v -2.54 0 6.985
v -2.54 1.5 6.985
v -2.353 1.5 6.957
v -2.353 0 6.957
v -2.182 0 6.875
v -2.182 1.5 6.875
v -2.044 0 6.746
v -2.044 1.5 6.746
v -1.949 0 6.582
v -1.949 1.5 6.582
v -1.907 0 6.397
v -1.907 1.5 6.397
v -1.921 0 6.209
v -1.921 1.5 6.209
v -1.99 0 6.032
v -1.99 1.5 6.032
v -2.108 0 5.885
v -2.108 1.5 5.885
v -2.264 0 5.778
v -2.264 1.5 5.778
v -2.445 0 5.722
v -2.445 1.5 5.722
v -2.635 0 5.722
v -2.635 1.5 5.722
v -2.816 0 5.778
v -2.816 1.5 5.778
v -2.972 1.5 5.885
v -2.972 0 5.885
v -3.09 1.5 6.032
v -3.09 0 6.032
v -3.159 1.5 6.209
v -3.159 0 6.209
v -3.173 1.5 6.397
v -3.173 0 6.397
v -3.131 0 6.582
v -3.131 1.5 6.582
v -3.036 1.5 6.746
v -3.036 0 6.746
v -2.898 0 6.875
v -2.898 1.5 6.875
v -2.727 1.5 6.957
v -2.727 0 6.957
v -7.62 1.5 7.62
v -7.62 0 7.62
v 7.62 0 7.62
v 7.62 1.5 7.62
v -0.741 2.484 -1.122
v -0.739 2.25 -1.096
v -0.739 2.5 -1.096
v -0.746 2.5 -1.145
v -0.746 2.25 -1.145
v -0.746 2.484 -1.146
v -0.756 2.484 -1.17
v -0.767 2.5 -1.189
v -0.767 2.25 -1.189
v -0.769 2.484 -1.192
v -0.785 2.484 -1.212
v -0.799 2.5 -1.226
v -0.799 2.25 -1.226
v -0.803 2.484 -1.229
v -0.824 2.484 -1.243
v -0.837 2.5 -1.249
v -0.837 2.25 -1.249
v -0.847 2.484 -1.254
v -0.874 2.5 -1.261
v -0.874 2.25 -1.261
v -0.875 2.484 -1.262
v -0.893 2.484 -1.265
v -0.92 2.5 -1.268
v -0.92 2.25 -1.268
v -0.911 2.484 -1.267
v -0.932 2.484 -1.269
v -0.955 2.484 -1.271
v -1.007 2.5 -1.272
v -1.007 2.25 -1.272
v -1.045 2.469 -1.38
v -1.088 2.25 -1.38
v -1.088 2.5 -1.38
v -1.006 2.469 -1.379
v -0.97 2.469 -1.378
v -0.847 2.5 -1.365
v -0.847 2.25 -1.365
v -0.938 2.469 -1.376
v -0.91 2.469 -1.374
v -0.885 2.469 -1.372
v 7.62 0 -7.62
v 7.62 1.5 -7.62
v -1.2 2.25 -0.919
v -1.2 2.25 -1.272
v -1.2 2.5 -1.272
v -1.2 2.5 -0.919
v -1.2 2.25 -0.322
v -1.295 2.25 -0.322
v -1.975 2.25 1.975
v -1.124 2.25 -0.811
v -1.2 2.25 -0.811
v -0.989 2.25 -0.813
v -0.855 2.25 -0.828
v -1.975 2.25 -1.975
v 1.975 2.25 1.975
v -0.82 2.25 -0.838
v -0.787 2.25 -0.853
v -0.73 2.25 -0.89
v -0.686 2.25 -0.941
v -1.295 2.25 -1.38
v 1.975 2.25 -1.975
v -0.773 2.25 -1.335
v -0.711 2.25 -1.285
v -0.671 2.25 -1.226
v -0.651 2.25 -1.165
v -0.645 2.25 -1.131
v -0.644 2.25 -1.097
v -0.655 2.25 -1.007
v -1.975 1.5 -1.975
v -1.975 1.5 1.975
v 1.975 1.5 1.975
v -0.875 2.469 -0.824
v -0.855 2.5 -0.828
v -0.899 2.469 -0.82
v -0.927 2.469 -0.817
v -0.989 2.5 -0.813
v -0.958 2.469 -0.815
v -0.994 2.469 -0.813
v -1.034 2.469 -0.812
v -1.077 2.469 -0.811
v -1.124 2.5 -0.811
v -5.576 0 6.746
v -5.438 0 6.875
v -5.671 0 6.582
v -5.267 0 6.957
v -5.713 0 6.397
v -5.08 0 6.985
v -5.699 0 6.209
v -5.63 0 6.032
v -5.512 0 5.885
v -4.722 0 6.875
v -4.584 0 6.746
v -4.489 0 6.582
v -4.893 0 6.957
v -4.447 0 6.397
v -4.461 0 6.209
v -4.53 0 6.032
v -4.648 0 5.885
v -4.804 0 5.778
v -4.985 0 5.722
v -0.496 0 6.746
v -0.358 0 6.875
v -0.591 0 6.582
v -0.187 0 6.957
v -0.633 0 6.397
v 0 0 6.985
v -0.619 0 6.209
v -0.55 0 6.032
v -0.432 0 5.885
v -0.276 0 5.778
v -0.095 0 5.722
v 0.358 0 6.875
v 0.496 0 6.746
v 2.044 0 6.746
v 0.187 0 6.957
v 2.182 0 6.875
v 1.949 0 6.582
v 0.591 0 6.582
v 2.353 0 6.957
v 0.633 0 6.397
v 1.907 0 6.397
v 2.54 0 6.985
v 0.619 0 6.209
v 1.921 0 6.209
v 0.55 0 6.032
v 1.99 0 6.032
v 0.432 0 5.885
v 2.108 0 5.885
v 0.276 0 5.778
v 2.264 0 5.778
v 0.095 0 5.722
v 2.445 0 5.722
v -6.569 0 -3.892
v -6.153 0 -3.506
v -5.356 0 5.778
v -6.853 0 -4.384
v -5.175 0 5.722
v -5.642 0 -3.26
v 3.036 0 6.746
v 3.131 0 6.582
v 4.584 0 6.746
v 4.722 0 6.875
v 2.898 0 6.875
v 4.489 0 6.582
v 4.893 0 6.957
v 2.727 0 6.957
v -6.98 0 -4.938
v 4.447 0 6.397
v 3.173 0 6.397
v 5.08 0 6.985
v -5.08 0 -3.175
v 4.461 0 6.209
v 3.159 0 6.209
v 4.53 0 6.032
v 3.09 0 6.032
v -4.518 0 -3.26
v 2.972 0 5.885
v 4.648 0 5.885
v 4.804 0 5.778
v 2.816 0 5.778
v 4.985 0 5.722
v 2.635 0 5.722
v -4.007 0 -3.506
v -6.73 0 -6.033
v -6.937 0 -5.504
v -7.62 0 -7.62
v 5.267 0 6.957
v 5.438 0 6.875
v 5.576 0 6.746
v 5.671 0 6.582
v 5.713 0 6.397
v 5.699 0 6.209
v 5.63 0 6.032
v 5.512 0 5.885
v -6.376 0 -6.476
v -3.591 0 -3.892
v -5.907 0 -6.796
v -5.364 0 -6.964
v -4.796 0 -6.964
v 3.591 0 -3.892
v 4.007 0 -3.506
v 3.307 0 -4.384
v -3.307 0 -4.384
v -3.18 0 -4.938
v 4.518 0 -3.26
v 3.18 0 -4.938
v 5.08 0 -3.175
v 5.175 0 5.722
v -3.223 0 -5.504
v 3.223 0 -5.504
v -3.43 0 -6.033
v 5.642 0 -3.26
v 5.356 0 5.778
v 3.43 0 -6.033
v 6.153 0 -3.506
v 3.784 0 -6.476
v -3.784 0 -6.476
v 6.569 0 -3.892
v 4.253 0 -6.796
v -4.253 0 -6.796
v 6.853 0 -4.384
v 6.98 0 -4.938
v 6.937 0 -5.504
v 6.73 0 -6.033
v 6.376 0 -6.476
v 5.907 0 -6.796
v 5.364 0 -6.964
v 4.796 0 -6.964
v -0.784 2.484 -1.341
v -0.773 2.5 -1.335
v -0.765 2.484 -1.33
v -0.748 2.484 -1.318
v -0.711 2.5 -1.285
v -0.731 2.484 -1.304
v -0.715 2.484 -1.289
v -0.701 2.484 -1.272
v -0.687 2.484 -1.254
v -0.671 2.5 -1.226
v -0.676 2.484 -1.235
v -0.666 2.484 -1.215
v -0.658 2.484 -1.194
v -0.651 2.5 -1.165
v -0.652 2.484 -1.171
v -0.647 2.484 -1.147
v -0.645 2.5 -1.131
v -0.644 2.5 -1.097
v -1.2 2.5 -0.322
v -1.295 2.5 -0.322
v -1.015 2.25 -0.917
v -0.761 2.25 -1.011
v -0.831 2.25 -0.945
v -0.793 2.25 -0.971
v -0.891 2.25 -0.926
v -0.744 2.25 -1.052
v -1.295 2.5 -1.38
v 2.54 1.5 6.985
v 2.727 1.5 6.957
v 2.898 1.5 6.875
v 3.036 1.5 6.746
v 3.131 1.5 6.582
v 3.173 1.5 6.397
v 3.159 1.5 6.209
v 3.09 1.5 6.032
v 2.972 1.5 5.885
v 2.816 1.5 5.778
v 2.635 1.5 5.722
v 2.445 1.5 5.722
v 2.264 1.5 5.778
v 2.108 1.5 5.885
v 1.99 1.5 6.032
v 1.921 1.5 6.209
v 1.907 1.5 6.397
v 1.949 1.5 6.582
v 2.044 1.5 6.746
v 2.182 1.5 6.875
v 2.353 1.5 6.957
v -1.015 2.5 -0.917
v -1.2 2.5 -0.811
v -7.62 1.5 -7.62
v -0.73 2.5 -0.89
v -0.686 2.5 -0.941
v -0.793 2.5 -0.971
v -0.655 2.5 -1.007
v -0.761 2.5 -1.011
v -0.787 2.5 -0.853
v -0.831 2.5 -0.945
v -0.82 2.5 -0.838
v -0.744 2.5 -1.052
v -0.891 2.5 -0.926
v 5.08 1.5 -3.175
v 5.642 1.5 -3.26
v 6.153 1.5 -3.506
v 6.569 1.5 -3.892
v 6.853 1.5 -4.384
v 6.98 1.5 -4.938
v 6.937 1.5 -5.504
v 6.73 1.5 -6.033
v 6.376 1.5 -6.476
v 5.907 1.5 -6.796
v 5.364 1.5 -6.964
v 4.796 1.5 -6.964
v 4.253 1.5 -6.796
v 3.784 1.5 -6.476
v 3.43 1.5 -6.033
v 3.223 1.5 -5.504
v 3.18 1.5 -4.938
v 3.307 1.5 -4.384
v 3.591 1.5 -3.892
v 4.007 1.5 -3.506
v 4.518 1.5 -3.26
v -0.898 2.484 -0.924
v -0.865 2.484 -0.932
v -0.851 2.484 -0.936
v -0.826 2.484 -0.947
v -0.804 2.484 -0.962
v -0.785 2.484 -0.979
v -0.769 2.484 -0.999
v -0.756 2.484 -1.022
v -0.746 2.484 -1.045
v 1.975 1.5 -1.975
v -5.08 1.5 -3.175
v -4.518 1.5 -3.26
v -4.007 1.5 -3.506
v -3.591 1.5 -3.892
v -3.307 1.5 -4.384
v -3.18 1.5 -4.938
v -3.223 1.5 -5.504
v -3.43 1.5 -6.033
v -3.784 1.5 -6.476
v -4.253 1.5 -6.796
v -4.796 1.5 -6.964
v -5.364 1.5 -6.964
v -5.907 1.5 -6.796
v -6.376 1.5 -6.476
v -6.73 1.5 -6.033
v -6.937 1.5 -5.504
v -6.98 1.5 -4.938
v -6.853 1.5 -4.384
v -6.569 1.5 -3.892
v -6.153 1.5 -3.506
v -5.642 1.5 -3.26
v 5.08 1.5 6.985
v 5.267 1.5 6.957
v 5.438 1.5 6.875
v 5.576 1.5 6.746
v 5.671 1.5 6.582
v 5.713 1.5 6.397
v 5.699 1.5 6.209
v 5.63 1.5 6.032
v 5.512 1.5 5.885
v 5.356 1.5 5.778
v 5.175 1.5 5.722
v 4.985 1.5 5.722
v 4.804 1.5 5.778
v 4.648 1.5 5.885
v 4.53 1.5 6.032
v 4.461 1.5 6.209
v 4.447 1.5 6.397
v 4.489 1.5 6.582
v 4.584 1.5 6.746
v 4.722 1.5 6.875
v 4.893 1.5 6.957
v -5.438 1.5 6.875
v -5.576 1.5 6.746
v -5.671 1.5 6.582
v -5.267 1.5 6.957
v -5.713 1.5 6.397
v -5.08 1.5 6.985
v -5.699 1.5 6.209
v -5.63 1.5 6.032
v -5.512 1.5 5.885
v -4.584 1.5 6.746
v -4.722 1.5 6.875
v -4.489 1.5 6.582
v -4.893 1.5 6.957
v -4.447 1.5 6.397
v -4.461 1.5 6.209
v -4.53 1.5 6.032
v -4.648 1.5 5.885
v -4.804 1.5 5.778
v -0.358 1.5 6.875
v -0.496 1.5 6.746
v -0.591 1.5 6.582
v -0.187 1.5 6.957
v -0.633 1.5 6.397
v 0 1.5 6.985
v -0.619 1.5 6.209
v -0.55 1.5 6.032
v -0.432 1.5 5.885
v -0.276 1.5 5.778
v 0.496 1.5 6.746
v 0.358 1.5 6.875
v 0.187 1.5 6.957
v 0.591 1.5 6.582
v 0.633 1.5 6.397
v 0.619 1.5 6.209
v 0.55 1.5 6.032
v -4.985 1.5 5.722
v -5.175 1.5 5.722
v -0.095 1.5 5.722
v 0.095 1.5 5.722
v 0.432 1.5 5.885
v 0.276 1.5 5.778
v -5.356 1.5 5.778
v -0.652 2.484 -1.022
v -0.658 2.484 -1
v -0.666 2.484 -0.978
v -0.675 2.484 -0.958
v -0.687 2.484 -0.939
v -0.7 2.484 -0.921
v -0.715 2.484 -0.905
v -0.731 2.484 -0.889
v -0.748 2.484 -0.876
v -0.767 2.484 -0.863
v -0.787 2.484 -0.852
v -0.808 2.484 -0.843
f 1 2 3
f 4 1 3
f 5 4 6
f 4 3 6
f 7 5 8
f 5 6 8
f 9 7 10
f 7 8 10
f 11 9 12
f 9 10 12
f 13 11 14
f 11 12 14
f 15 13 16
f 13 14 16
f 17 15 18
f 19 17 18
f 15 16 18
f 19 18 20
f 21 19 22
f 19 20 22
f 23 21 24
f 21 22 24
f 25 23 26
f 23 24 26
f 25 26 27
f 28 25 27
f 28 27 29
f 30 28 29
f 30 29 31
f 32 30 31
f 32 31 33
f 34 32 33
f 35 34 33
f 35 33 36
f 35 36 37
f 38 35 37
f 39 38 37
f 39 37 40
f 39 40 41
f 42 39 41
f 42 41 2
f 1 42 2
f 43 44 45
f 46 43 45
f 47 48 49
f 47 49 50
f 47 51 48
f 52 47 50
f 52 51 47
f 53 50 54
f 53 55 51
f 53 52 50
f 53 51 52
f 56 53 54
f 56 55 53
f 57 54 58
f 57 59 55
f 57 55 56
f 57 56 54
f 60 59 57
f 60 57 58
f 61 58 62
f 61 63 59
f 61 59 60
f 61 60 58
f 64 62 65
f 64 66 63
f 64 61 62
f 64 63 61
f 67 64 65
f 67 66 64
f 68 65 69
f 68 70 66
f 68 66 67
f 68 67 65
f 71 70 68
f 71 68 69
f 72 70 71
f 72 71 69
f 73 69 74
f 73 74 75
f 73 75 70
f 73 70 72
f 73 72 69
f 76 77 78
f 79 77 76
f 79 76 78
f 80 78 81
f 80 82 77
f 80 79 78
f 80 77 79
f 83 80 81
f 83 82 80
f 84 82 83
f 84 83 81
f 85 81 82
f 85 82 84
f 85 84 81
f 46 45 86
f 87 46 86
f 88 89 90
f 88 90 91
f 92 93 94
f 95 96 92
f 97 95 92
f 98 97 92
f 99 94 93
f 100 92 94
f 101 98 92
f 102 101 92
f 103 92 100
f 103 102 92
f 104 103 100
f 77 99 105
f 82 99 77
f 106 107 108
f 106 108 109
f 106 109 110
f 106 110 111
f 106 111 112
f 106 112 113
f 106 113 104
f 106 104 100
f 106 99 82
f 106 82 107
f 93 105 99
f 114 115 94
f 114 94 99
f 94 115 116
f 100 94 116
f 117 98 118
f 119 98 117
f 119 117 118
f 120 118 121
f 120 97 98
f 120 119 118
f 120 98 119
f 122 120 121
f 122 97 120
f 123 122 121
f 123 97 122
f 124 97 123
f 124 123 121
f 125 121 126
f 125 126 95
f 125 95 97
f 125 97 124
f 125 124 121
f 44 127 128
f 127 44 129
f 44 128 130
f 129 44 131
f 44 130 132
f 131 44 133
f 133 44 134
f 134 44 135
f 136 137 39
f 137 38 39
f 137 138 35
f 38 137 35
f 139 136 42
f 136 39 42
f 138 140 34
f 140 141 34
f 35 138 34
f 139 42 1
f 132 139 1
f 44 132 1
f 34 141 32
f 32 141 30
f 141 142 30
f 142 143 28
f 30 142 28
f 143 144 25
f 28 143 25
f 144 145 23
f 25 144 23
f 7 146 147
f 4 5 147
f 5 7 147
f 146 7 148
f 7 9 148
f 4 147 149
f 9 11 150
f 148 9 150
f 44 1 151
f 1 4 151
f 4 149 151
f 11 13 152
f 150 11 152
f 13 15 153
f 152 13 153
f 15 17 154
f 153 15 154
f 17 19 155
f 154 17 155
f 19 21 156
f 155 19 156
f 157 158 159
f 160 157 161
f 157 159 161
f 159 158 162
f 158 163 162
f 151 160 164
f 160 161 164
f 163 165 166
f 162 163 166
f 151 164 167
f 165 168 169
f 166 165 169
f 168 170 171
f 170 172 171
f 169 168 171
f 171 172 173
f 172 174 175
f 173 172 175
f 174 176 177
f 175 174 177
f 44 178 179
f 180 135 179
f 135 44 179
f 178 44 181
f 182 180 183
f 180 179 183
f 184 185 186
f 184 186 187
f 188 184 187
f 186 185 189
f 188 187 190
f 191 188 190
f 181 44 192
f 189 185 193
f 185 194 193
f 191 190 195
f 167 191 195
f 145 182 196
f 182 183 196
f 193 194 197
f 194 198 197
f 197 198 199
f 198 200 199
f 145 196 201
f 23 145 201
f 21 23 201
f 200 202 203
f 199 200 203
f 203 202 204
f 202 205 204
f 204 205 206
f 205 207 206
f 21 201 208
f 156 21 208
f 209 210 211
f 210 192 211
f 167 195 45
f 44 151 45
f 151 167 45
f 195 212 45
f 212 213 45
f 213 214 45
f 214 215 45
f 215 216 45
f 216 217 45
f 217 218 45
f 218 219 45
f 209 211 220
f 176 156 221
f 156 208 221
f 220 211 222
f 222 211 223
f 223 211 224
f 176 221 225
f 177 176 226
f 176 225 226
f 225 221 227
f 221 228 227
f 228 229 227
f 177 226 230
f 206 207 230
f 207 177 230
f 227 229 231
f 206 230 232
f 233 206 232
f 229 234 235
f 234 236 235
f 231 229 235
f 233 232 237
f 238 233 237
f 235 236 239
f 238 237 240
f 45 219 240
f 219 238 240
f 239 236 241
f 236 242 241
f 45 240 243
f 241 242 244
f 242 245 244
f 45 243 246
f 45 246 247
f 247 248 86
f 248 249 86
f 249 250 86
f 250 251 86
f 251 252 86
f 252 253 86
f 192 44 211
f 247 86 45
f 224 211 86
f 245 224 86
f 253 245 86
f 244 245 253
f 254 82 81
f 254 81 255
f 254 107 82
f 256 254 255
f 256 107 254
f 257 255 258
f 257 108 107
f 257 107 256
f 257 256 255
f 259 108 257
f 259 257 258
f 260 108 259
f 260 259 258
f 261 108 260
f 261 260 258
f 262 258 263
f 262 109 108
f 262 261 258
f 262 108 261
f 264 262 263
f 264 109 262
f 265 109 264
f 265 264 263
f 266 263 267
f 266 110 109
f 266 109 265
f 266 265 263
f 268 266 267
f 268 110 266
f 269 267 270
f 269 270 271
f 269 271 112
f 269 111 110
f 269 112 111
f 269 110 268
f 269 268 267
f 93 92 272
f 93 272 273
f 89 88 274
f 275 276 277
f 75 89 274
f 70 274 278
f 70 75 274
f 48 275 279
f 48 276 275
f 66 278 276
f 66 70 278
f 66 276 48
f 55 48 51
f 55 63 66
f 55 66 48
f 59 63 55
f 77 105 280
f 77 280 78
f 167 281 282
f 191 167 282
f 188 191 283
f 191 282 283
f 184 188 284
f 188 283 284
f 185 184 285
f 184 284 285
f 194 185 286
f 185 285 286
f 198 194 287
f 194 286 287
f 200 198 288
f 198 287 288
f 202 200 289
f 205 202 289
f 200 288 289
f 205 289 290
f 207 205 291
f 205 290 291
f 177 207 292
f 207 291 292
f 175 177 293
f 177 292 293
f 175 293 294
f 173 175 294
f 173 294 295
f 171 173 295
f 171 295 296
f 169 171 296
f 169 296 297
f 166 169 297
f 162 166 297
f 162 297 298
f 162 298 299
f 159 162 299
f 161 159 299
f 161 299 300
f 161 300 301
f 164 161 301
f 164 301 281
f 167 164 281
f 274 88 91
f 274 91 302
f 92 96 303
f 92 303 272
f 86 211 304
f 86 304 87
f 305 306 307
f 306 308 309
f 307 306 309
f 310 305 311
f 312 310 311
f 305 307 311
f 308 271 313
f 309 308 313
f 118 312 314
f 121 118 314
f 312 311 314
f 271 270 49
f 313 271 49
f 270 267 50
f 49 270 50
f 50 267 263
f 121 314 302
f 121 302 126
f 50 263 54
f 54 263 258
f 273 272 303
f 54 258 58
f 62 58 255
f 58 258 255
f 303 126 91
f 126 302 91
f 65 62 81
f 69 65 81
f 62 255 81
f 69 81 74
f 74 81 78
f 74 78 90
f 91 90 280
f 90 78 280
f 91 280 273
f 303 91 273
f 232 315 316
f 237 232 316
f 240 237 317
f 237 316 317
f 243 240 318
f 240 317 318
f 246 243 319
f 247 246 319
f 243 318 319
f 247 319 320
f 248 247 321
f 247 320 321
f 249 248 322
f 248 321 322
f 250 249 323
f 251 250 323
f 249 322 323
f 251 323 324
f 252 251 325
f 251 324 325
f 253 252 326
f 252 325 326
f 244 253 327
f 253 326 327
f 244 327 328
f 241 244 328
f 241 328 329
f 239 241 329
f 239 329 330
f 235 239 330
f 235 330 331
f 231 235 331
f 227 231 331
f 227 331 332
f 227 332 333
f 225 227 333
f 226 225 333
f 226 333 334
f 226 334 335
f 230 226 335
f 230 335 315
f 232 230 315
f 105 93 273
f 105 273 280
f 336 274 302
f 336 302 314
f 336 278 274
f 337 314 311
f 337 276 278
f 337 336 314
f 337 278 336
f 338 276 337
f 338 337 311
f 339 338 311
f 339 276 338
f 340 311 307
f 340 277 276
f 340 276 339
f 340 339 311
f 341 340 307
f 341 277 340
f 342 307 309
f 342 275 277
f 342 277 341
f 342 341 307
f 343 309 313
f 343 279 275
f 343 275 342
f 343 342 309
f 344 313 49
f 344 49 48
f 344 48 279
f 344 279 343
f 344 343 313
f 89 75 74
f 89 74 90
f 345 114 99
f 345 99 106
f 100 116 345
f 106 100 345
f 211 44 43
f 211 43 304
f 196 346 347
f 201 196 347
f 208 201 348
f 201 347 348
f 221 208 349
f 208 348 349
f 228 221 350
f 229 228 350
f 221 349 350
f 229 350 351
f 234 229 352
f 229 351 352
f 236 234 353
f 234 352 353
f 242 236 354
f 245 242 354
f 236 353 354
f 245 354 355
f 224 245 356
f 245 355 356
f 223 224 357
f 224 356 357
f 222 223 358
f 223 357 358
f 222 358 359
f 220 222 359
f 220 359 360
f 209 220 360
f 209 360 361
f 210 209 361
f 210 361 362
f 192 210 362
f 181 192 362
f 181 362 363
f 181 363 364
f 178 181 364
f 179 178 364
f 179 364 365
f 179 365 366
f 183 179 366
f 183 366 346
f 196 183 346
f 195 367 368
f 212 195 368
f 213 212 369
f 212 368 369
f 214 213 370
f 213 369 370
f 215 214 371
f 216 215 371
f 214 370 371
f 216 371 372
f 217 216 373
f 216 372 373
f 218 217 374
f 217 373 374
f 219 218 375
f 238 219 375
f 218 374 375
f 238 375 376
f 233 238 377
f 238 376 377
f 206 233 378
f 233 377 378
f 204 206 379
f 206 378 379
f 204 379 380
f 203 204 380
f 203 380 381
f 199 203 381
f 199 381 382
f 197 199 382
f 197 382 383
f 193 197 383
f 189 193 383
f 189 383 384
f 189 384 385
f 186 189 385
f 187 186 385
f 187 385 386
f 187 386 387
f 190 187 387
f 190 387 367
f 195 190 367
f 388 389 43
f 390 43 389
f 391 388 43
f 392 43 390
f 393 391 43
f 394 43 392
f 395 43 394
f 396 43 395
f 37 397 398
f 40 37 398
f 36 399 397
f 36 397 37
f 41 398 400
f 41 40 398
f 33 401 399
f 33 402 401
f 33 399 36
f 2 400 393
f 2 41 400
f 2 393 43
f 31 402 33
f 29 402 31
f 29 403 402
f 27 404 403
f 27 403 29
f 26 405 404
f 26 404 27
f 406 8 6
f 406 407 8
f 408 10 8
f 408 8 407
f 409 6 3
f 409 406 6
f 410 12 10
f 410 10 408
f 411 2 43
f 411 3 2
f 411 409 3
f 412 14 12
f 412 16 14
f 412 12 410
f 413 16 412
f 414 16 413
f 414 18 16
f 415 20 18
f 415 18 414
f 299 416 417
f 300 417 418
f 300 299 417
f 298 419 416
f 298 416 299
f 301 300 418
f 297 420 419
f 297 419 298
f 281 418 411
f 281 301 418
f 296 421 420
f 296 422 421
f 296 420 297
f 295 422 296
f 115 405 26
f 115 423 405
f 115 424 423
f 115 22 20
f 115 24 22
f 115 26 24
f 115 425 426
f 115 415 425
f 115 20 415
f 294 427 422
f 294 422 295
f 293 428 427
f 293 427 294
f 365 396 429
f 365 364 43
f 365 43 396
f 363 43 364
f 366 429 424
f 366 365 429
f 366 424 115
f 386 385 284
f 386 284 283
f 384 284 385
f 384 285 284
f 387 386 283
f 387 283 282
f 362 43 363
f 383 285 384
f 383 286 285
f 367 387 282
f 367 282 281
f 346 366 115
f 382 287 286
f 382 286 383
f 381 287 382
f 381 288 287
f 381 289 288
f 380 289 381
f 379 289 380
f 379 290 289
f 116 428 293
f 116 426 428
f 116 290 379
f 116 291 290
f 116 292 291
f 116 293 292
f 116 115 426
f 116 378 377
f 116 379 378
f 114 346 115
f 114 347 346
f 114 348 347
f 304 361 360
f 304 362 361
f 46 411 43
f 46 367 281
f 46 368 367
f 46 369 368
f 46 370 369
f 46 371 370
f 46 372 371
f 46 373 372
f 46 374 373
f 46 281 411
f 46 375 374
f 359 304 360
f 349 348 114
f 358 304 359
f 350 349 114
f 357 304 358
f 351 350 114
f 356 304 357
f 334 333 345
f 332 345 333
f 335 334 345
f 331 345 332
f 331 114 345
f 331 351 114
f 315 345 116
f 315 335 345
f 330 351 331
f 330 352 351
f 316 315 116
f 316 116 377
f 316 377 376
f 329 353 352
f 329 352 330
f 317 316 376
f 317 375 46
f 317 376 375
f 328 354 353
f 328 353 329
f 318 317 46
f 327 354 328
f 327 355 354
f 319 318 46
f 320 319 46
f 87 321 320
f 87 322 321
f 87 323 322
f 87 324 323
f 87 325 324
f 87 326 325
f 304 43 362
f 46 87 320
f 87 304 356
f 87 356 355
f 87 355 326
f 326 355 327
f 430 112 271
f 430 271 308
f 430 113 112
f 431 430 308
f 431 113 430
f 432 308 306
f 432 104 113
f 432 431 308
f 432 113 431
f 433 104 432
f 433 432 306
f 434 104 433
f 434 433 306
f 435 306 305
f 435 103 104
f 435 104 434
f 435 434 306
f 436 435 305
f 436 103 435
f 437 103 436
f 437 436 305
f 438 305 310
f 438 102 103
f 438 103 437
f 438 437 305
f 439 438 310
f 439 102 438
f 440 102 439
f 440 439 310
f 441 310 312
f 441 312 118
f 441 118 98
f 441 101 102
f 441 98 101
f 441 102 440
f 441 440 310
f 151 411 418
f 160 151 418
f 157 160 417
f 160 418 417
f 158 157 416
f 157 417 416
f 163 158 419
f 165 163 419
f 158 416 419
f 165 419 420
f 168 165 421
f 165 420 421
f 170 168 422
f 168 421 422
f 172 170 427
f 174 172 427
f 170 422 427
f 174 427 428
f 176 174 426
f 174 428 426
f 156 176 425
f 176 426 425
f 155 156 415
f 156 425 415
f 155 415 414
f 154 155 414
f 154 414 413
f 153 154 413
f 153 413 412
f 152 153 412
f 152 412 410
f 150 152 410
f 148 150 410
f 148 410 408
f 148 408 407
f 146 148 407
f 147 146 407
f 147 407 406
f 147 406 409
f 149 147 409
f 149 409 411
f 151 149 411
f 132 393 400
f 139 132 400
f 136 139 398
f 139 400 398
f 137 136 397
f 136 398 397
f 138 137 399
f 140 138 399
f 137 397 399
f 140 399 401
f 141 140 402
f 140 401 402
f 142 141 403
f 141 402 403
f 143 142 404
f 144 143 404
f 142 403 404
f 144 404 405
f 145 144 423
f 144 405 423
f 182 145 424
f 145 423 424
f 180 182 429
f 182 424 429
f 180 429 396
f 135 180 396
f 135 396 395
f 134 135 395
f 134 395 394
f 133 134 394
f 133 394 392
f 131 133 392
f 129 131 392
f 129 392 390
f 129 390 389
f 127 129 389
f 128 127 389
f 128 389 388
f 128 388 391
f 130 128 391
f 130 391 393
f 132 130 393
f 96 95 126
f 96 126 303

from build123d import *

# Parameters (mm, degrees)
SKETCH1_W           = 15.24
SKETCH1_H           = 15.24
BOSS_EXTRUDE1_DEPTH = 1.5
SKETCH2_R           = 1.905
SKETCH2_R_2         = 0.635
CUT_EXTRUDE1_DEPTH  = 11.880202204
SKETCH3_W           = 3.95
SKETCH3_H           = 3.95
BOSS_EXTRUDE2_DEPTH = 0.75
BOSS_EXTRUDE3_DEPTH = 0.25


with BuildPart() as part:
    # Sketch1 → Boss-Extrude1 (new body)
    with BuildSketch(Plane(origin=(0, 0, 0), x_dir=(1, 0, 0), z_dir=(0, 1, 0))):
        Rectangle(SKETCH1_W, SKETCH1_H)
    extrude(amount=BOSS_EXTRUDE1_DEPTH)

    # Sketch2 → Cut-Extrude1 (cut, through all)
    with BuildSketch(Plane(origin=(0, 1.5, 0), x_dir=(1, 0, 0), z_dir=(0, 1, 0))):
        with Locations(Location((-5.08, 5.08, 0), (0, 0, 270))):
            Circle(SKETCH2_R)
        with Locations(Location((5.08, 5.08, 0), (0, 0, 270))):
            Circle(SKETCH2_R)
        with Locations(Location((5.08, -6.35, 0), (0, 0, 270))):
            Circle(SKETCH2_R_2)
        with Locations(Location((2.54, -6.35, 0), (0, 0, 270))):
            Circle(SKETCH2_R_2)
        with Locations(Location((0, -6.35, 0), (0, 0, 270))):
            Circle(SKETCH2_R_2)
        with Locations(Location((-2.54, -6.35, 0), (0, 0, 270))):
            Circle(SKETCH2_R_2)
        with Locations(Location((-5.08, -6.35, 0), (0, 0, 270))):
            Circle(SKETCH2_R_2)
    extrude(amount=-CUT_EXTRUDE1_DEPTH, mode=Mode.SUBTRACT)

    # Sketch3 → Boss-Extrude2 (add)
    with BuildSketch(Plane(origin=(0, 1.5, 0), x_dir=(1, 0, 0), z_dir=(0, 1, 0))):
        Rectangle(SKETCH3_W, SKETCH3_H)
    extrude(amount=BOSS_EXTRUDE2_DEPTH)

    # Sketch4 → Boss-Extrude3 (add)
    with BuildSketch(Plane(origin=(0, 2.25, 0), x_dir=(1, 0, 0), z_dir=(0, 1, 0))):
        with BuildLine():
            Line((-1.295144256, 1.380499313), (-1.087590503, 1.380499313))
            add(Edge.make_bspline(
                [(-1.087590503, 1.380499313), (-1.073314825, 1.38048362), (-1.04596199, 1.380453553), (-1.006738628, 1.379541951), (-0.971115209, 1.378324356), (-0.939168546, 1.376636498), (-0.910800345, 1.374641815), (-0.886138971, 1.371844174), (-0.864990582, 1.368923085), (-0.85231887, 1.365953279), (-0.846539822, 1.364598872)],
                knots=[0, 0, 0, 0, 1.415646017, 2.712440637, 3.8905458, 4.950247383, 5.884950622, 6.709939814, 7.411656543, 8, 8, 8, 8], degree=3))
            add(Edge.make_bspline(
                [(-0.846539822, 1.364598872), (-0.839224159, 1.362596521), (-0.824765215, 1.358639001), (-0.803930852, 1.35071247), (-0.784108618, 1.341313815), (-0.765230504, 1.33060229), (-0.747528493, 1.318118322), (-0.730738476, 1.304367966), (-0.715008625, 1.289033754), (-0.700427395, 1.272287673), (-0.687036515, 1.254410848), (-0.675506825, 1.235136412), (-0.66585264, 1.214788803), (-0.65757246, 1.193382176), (-0.651612999, 1.170736768), (-0.64712358, 1.147009929), (-0.644274054, 1.122204201), (-0.644001137, 1.105252765), (-0.643862205, 1.096623445)],
                knots=[0, 0, 0, 0, 0.999701418, 1.975846123, 2.934577507, 3.890451536, 4.834027766, 5.787354733, 6.749476667, 7.726910423, 8.712836071, 9.690891519, 10.682875813, 11.679750201, 12.712814741, 13.765529915, 14.8625177, 16, 16, 16, 16], degree=3))
            add(Edge.make_bspline(
                [(-0.643862205, 1.096623445), (-0.643989636, 1.087921593), (-0.644238963, 1.070895833), (-0.647231411, 1.045987871), (-0.651262207, 1.022184929), (-0.657460125, 0.999539786), (-0.665577745, 0.978186922), (-0.675100342, 0.957800025), (-0.686585838, 0.938725934), (-0.699783203, 0.920895401), (-0.714464281, 0.904291689), (-0.730566955, 0.889035121), (-0.748026217, 0.875214999), (-0.766786581, 0.862800343), (-0.78703094, 0.852079039), (-0.808452258, 0.842476235), (-0.831236728, 0.834411414), (-0.847003631, 0.830168991), (-0.855020057, 0.828012)],
                knots=[0, 0, 0, 0, 1.121902311, 2.195077645, 3.232258892, 4.234102512, 5.217864754, 6.176164875, 7.132989551, 8.084763148, 9.034132444, 9.988522005, 10.94243251, 11.903244335, 12.886203696, 13.894208494, 14.929344452, 16, 16, 16, 16], degree=3))
            add(Edge.make_bspline(
                [(-0.855020057, 0.828012), (-0.861650466, 0.826602003), (-0.87618139, 0.823511913), (-0.900112642, 0.820062213), (-0.927975652, 0.817117748), (-0.959732389, 0.814910024), (-0.995354348, 0.813020031), (-1.0348608, 0.811517774), (-1.078329294, 0.810692318), (-1.108649409, 0.810649745), (-1.124479526, 0.810627518)],
                knots=[0, 0, 0, 0, 0.601384939, 1.31797006, 2.144135048, 3.087295005, 4.142315834, 5.309527816, 6.595305764, 8, 8, 8, 8], degree=3))
            Line((-1.124479526, 0.810627518), (-1.200165624, 0.810627518))
            Line((-1.200165624, 0.810627518), (-1.200165624, 0.322165979))
            Line((-1.200165624, 0.322165979), (-1.295144256, 0.322165979))
            Line((-1.295144256, 0.322165979), (-1.295144256, 1.380499313))
        make_face()
        with BuildLine():
            Line((-1.200165624, 1.271952304), (-1.200165624, 0.919174527))
            Line((-1.200165624, 0.919174527), (-1.014872488, 0.916842462))
            add(Edge.make_bspline(
                [(-1.014872488, 0.916842462), (-1.005825272, 0.916837786), (-0.988359809, 0.916828759), (-0.963130284, 0.918033815), (-0.93972319, 0.919424928), (-0.918210426, 0.921461743), (-0.898582293, 0.92434079), (-0.880806064, 0.927247197), (-0.865019576, 0.931451913), (-0.846544342, 0.937113413), (-0.825957234, 0.946769228), (-0.803560618, 0.960784552), (-0.784579989, 0.978649432), (-0.76815517, 0.998735943), (-0.755120774, 1.021081632), (-0.745578843, 1.044990573), (-0.73997235, 1.070217565), (-0.739220572, 1.087479931), (-0.738840837, 1.096199433)],
                knots=[0, 0, 0, 0, 1.160613943, 2.240541288, 3.23993089, 4.169200891, 5.011653406, 5.7853311, 6.478053781, 7.106038997, 8.262395093, 9.384106736, 10.481365981, 11.59014053, 12.70357646, 13.786202915, 14.881775077, 16, 16, 16, 16], degree=3))
            add(Edge.make_bspline(
                [(-0.738840837, 1.096199433), (-0.739222638, 1.104707984), (-0.739981609, 1.121621929), (-0.745622787, 1.146410745), (-0.755102222, 1.170067731), (-0.768242669, 1.192133402), (-0.784190582, 1.212147636), (-0.802726336, 1.229533672), (-0.823806298, 1.243510235), (-0.843415168, 1.252531251), (-0.860832669, 1.258039203), (-0.875961381, 1.261893), (-0.893043085, 1.264969909), (-0.912083342, 1.267461378), (-0.932934575, 1.26959421), (-0.955775923, 1.271041399), (-0.980520858, 1.271888506), (-0.997699292, 1.271930523), (-1.006604259, 1.271952304)],
                knots=[0, 0, 0, 0, 1.120700087, 2.227813068, 3.331159281, 4.466773991, 5.599788987, 6.693661531, 7.80175334, 8.91857717, 9.525282508, 10.207424825, 10.974604443, 11.810962634, 12.737642355, 13.736264703, 14.826523623, 16, 16, 16, 16], degree=3))
            Line((-1.006604259, 1.271952304), (-1.200165624, 1.271952304))
        make_face(mode=Mode.SUBTRACT)
    extrude(amount=BOSS_EXTRUDE3_DEPTH)


solid = part.part
